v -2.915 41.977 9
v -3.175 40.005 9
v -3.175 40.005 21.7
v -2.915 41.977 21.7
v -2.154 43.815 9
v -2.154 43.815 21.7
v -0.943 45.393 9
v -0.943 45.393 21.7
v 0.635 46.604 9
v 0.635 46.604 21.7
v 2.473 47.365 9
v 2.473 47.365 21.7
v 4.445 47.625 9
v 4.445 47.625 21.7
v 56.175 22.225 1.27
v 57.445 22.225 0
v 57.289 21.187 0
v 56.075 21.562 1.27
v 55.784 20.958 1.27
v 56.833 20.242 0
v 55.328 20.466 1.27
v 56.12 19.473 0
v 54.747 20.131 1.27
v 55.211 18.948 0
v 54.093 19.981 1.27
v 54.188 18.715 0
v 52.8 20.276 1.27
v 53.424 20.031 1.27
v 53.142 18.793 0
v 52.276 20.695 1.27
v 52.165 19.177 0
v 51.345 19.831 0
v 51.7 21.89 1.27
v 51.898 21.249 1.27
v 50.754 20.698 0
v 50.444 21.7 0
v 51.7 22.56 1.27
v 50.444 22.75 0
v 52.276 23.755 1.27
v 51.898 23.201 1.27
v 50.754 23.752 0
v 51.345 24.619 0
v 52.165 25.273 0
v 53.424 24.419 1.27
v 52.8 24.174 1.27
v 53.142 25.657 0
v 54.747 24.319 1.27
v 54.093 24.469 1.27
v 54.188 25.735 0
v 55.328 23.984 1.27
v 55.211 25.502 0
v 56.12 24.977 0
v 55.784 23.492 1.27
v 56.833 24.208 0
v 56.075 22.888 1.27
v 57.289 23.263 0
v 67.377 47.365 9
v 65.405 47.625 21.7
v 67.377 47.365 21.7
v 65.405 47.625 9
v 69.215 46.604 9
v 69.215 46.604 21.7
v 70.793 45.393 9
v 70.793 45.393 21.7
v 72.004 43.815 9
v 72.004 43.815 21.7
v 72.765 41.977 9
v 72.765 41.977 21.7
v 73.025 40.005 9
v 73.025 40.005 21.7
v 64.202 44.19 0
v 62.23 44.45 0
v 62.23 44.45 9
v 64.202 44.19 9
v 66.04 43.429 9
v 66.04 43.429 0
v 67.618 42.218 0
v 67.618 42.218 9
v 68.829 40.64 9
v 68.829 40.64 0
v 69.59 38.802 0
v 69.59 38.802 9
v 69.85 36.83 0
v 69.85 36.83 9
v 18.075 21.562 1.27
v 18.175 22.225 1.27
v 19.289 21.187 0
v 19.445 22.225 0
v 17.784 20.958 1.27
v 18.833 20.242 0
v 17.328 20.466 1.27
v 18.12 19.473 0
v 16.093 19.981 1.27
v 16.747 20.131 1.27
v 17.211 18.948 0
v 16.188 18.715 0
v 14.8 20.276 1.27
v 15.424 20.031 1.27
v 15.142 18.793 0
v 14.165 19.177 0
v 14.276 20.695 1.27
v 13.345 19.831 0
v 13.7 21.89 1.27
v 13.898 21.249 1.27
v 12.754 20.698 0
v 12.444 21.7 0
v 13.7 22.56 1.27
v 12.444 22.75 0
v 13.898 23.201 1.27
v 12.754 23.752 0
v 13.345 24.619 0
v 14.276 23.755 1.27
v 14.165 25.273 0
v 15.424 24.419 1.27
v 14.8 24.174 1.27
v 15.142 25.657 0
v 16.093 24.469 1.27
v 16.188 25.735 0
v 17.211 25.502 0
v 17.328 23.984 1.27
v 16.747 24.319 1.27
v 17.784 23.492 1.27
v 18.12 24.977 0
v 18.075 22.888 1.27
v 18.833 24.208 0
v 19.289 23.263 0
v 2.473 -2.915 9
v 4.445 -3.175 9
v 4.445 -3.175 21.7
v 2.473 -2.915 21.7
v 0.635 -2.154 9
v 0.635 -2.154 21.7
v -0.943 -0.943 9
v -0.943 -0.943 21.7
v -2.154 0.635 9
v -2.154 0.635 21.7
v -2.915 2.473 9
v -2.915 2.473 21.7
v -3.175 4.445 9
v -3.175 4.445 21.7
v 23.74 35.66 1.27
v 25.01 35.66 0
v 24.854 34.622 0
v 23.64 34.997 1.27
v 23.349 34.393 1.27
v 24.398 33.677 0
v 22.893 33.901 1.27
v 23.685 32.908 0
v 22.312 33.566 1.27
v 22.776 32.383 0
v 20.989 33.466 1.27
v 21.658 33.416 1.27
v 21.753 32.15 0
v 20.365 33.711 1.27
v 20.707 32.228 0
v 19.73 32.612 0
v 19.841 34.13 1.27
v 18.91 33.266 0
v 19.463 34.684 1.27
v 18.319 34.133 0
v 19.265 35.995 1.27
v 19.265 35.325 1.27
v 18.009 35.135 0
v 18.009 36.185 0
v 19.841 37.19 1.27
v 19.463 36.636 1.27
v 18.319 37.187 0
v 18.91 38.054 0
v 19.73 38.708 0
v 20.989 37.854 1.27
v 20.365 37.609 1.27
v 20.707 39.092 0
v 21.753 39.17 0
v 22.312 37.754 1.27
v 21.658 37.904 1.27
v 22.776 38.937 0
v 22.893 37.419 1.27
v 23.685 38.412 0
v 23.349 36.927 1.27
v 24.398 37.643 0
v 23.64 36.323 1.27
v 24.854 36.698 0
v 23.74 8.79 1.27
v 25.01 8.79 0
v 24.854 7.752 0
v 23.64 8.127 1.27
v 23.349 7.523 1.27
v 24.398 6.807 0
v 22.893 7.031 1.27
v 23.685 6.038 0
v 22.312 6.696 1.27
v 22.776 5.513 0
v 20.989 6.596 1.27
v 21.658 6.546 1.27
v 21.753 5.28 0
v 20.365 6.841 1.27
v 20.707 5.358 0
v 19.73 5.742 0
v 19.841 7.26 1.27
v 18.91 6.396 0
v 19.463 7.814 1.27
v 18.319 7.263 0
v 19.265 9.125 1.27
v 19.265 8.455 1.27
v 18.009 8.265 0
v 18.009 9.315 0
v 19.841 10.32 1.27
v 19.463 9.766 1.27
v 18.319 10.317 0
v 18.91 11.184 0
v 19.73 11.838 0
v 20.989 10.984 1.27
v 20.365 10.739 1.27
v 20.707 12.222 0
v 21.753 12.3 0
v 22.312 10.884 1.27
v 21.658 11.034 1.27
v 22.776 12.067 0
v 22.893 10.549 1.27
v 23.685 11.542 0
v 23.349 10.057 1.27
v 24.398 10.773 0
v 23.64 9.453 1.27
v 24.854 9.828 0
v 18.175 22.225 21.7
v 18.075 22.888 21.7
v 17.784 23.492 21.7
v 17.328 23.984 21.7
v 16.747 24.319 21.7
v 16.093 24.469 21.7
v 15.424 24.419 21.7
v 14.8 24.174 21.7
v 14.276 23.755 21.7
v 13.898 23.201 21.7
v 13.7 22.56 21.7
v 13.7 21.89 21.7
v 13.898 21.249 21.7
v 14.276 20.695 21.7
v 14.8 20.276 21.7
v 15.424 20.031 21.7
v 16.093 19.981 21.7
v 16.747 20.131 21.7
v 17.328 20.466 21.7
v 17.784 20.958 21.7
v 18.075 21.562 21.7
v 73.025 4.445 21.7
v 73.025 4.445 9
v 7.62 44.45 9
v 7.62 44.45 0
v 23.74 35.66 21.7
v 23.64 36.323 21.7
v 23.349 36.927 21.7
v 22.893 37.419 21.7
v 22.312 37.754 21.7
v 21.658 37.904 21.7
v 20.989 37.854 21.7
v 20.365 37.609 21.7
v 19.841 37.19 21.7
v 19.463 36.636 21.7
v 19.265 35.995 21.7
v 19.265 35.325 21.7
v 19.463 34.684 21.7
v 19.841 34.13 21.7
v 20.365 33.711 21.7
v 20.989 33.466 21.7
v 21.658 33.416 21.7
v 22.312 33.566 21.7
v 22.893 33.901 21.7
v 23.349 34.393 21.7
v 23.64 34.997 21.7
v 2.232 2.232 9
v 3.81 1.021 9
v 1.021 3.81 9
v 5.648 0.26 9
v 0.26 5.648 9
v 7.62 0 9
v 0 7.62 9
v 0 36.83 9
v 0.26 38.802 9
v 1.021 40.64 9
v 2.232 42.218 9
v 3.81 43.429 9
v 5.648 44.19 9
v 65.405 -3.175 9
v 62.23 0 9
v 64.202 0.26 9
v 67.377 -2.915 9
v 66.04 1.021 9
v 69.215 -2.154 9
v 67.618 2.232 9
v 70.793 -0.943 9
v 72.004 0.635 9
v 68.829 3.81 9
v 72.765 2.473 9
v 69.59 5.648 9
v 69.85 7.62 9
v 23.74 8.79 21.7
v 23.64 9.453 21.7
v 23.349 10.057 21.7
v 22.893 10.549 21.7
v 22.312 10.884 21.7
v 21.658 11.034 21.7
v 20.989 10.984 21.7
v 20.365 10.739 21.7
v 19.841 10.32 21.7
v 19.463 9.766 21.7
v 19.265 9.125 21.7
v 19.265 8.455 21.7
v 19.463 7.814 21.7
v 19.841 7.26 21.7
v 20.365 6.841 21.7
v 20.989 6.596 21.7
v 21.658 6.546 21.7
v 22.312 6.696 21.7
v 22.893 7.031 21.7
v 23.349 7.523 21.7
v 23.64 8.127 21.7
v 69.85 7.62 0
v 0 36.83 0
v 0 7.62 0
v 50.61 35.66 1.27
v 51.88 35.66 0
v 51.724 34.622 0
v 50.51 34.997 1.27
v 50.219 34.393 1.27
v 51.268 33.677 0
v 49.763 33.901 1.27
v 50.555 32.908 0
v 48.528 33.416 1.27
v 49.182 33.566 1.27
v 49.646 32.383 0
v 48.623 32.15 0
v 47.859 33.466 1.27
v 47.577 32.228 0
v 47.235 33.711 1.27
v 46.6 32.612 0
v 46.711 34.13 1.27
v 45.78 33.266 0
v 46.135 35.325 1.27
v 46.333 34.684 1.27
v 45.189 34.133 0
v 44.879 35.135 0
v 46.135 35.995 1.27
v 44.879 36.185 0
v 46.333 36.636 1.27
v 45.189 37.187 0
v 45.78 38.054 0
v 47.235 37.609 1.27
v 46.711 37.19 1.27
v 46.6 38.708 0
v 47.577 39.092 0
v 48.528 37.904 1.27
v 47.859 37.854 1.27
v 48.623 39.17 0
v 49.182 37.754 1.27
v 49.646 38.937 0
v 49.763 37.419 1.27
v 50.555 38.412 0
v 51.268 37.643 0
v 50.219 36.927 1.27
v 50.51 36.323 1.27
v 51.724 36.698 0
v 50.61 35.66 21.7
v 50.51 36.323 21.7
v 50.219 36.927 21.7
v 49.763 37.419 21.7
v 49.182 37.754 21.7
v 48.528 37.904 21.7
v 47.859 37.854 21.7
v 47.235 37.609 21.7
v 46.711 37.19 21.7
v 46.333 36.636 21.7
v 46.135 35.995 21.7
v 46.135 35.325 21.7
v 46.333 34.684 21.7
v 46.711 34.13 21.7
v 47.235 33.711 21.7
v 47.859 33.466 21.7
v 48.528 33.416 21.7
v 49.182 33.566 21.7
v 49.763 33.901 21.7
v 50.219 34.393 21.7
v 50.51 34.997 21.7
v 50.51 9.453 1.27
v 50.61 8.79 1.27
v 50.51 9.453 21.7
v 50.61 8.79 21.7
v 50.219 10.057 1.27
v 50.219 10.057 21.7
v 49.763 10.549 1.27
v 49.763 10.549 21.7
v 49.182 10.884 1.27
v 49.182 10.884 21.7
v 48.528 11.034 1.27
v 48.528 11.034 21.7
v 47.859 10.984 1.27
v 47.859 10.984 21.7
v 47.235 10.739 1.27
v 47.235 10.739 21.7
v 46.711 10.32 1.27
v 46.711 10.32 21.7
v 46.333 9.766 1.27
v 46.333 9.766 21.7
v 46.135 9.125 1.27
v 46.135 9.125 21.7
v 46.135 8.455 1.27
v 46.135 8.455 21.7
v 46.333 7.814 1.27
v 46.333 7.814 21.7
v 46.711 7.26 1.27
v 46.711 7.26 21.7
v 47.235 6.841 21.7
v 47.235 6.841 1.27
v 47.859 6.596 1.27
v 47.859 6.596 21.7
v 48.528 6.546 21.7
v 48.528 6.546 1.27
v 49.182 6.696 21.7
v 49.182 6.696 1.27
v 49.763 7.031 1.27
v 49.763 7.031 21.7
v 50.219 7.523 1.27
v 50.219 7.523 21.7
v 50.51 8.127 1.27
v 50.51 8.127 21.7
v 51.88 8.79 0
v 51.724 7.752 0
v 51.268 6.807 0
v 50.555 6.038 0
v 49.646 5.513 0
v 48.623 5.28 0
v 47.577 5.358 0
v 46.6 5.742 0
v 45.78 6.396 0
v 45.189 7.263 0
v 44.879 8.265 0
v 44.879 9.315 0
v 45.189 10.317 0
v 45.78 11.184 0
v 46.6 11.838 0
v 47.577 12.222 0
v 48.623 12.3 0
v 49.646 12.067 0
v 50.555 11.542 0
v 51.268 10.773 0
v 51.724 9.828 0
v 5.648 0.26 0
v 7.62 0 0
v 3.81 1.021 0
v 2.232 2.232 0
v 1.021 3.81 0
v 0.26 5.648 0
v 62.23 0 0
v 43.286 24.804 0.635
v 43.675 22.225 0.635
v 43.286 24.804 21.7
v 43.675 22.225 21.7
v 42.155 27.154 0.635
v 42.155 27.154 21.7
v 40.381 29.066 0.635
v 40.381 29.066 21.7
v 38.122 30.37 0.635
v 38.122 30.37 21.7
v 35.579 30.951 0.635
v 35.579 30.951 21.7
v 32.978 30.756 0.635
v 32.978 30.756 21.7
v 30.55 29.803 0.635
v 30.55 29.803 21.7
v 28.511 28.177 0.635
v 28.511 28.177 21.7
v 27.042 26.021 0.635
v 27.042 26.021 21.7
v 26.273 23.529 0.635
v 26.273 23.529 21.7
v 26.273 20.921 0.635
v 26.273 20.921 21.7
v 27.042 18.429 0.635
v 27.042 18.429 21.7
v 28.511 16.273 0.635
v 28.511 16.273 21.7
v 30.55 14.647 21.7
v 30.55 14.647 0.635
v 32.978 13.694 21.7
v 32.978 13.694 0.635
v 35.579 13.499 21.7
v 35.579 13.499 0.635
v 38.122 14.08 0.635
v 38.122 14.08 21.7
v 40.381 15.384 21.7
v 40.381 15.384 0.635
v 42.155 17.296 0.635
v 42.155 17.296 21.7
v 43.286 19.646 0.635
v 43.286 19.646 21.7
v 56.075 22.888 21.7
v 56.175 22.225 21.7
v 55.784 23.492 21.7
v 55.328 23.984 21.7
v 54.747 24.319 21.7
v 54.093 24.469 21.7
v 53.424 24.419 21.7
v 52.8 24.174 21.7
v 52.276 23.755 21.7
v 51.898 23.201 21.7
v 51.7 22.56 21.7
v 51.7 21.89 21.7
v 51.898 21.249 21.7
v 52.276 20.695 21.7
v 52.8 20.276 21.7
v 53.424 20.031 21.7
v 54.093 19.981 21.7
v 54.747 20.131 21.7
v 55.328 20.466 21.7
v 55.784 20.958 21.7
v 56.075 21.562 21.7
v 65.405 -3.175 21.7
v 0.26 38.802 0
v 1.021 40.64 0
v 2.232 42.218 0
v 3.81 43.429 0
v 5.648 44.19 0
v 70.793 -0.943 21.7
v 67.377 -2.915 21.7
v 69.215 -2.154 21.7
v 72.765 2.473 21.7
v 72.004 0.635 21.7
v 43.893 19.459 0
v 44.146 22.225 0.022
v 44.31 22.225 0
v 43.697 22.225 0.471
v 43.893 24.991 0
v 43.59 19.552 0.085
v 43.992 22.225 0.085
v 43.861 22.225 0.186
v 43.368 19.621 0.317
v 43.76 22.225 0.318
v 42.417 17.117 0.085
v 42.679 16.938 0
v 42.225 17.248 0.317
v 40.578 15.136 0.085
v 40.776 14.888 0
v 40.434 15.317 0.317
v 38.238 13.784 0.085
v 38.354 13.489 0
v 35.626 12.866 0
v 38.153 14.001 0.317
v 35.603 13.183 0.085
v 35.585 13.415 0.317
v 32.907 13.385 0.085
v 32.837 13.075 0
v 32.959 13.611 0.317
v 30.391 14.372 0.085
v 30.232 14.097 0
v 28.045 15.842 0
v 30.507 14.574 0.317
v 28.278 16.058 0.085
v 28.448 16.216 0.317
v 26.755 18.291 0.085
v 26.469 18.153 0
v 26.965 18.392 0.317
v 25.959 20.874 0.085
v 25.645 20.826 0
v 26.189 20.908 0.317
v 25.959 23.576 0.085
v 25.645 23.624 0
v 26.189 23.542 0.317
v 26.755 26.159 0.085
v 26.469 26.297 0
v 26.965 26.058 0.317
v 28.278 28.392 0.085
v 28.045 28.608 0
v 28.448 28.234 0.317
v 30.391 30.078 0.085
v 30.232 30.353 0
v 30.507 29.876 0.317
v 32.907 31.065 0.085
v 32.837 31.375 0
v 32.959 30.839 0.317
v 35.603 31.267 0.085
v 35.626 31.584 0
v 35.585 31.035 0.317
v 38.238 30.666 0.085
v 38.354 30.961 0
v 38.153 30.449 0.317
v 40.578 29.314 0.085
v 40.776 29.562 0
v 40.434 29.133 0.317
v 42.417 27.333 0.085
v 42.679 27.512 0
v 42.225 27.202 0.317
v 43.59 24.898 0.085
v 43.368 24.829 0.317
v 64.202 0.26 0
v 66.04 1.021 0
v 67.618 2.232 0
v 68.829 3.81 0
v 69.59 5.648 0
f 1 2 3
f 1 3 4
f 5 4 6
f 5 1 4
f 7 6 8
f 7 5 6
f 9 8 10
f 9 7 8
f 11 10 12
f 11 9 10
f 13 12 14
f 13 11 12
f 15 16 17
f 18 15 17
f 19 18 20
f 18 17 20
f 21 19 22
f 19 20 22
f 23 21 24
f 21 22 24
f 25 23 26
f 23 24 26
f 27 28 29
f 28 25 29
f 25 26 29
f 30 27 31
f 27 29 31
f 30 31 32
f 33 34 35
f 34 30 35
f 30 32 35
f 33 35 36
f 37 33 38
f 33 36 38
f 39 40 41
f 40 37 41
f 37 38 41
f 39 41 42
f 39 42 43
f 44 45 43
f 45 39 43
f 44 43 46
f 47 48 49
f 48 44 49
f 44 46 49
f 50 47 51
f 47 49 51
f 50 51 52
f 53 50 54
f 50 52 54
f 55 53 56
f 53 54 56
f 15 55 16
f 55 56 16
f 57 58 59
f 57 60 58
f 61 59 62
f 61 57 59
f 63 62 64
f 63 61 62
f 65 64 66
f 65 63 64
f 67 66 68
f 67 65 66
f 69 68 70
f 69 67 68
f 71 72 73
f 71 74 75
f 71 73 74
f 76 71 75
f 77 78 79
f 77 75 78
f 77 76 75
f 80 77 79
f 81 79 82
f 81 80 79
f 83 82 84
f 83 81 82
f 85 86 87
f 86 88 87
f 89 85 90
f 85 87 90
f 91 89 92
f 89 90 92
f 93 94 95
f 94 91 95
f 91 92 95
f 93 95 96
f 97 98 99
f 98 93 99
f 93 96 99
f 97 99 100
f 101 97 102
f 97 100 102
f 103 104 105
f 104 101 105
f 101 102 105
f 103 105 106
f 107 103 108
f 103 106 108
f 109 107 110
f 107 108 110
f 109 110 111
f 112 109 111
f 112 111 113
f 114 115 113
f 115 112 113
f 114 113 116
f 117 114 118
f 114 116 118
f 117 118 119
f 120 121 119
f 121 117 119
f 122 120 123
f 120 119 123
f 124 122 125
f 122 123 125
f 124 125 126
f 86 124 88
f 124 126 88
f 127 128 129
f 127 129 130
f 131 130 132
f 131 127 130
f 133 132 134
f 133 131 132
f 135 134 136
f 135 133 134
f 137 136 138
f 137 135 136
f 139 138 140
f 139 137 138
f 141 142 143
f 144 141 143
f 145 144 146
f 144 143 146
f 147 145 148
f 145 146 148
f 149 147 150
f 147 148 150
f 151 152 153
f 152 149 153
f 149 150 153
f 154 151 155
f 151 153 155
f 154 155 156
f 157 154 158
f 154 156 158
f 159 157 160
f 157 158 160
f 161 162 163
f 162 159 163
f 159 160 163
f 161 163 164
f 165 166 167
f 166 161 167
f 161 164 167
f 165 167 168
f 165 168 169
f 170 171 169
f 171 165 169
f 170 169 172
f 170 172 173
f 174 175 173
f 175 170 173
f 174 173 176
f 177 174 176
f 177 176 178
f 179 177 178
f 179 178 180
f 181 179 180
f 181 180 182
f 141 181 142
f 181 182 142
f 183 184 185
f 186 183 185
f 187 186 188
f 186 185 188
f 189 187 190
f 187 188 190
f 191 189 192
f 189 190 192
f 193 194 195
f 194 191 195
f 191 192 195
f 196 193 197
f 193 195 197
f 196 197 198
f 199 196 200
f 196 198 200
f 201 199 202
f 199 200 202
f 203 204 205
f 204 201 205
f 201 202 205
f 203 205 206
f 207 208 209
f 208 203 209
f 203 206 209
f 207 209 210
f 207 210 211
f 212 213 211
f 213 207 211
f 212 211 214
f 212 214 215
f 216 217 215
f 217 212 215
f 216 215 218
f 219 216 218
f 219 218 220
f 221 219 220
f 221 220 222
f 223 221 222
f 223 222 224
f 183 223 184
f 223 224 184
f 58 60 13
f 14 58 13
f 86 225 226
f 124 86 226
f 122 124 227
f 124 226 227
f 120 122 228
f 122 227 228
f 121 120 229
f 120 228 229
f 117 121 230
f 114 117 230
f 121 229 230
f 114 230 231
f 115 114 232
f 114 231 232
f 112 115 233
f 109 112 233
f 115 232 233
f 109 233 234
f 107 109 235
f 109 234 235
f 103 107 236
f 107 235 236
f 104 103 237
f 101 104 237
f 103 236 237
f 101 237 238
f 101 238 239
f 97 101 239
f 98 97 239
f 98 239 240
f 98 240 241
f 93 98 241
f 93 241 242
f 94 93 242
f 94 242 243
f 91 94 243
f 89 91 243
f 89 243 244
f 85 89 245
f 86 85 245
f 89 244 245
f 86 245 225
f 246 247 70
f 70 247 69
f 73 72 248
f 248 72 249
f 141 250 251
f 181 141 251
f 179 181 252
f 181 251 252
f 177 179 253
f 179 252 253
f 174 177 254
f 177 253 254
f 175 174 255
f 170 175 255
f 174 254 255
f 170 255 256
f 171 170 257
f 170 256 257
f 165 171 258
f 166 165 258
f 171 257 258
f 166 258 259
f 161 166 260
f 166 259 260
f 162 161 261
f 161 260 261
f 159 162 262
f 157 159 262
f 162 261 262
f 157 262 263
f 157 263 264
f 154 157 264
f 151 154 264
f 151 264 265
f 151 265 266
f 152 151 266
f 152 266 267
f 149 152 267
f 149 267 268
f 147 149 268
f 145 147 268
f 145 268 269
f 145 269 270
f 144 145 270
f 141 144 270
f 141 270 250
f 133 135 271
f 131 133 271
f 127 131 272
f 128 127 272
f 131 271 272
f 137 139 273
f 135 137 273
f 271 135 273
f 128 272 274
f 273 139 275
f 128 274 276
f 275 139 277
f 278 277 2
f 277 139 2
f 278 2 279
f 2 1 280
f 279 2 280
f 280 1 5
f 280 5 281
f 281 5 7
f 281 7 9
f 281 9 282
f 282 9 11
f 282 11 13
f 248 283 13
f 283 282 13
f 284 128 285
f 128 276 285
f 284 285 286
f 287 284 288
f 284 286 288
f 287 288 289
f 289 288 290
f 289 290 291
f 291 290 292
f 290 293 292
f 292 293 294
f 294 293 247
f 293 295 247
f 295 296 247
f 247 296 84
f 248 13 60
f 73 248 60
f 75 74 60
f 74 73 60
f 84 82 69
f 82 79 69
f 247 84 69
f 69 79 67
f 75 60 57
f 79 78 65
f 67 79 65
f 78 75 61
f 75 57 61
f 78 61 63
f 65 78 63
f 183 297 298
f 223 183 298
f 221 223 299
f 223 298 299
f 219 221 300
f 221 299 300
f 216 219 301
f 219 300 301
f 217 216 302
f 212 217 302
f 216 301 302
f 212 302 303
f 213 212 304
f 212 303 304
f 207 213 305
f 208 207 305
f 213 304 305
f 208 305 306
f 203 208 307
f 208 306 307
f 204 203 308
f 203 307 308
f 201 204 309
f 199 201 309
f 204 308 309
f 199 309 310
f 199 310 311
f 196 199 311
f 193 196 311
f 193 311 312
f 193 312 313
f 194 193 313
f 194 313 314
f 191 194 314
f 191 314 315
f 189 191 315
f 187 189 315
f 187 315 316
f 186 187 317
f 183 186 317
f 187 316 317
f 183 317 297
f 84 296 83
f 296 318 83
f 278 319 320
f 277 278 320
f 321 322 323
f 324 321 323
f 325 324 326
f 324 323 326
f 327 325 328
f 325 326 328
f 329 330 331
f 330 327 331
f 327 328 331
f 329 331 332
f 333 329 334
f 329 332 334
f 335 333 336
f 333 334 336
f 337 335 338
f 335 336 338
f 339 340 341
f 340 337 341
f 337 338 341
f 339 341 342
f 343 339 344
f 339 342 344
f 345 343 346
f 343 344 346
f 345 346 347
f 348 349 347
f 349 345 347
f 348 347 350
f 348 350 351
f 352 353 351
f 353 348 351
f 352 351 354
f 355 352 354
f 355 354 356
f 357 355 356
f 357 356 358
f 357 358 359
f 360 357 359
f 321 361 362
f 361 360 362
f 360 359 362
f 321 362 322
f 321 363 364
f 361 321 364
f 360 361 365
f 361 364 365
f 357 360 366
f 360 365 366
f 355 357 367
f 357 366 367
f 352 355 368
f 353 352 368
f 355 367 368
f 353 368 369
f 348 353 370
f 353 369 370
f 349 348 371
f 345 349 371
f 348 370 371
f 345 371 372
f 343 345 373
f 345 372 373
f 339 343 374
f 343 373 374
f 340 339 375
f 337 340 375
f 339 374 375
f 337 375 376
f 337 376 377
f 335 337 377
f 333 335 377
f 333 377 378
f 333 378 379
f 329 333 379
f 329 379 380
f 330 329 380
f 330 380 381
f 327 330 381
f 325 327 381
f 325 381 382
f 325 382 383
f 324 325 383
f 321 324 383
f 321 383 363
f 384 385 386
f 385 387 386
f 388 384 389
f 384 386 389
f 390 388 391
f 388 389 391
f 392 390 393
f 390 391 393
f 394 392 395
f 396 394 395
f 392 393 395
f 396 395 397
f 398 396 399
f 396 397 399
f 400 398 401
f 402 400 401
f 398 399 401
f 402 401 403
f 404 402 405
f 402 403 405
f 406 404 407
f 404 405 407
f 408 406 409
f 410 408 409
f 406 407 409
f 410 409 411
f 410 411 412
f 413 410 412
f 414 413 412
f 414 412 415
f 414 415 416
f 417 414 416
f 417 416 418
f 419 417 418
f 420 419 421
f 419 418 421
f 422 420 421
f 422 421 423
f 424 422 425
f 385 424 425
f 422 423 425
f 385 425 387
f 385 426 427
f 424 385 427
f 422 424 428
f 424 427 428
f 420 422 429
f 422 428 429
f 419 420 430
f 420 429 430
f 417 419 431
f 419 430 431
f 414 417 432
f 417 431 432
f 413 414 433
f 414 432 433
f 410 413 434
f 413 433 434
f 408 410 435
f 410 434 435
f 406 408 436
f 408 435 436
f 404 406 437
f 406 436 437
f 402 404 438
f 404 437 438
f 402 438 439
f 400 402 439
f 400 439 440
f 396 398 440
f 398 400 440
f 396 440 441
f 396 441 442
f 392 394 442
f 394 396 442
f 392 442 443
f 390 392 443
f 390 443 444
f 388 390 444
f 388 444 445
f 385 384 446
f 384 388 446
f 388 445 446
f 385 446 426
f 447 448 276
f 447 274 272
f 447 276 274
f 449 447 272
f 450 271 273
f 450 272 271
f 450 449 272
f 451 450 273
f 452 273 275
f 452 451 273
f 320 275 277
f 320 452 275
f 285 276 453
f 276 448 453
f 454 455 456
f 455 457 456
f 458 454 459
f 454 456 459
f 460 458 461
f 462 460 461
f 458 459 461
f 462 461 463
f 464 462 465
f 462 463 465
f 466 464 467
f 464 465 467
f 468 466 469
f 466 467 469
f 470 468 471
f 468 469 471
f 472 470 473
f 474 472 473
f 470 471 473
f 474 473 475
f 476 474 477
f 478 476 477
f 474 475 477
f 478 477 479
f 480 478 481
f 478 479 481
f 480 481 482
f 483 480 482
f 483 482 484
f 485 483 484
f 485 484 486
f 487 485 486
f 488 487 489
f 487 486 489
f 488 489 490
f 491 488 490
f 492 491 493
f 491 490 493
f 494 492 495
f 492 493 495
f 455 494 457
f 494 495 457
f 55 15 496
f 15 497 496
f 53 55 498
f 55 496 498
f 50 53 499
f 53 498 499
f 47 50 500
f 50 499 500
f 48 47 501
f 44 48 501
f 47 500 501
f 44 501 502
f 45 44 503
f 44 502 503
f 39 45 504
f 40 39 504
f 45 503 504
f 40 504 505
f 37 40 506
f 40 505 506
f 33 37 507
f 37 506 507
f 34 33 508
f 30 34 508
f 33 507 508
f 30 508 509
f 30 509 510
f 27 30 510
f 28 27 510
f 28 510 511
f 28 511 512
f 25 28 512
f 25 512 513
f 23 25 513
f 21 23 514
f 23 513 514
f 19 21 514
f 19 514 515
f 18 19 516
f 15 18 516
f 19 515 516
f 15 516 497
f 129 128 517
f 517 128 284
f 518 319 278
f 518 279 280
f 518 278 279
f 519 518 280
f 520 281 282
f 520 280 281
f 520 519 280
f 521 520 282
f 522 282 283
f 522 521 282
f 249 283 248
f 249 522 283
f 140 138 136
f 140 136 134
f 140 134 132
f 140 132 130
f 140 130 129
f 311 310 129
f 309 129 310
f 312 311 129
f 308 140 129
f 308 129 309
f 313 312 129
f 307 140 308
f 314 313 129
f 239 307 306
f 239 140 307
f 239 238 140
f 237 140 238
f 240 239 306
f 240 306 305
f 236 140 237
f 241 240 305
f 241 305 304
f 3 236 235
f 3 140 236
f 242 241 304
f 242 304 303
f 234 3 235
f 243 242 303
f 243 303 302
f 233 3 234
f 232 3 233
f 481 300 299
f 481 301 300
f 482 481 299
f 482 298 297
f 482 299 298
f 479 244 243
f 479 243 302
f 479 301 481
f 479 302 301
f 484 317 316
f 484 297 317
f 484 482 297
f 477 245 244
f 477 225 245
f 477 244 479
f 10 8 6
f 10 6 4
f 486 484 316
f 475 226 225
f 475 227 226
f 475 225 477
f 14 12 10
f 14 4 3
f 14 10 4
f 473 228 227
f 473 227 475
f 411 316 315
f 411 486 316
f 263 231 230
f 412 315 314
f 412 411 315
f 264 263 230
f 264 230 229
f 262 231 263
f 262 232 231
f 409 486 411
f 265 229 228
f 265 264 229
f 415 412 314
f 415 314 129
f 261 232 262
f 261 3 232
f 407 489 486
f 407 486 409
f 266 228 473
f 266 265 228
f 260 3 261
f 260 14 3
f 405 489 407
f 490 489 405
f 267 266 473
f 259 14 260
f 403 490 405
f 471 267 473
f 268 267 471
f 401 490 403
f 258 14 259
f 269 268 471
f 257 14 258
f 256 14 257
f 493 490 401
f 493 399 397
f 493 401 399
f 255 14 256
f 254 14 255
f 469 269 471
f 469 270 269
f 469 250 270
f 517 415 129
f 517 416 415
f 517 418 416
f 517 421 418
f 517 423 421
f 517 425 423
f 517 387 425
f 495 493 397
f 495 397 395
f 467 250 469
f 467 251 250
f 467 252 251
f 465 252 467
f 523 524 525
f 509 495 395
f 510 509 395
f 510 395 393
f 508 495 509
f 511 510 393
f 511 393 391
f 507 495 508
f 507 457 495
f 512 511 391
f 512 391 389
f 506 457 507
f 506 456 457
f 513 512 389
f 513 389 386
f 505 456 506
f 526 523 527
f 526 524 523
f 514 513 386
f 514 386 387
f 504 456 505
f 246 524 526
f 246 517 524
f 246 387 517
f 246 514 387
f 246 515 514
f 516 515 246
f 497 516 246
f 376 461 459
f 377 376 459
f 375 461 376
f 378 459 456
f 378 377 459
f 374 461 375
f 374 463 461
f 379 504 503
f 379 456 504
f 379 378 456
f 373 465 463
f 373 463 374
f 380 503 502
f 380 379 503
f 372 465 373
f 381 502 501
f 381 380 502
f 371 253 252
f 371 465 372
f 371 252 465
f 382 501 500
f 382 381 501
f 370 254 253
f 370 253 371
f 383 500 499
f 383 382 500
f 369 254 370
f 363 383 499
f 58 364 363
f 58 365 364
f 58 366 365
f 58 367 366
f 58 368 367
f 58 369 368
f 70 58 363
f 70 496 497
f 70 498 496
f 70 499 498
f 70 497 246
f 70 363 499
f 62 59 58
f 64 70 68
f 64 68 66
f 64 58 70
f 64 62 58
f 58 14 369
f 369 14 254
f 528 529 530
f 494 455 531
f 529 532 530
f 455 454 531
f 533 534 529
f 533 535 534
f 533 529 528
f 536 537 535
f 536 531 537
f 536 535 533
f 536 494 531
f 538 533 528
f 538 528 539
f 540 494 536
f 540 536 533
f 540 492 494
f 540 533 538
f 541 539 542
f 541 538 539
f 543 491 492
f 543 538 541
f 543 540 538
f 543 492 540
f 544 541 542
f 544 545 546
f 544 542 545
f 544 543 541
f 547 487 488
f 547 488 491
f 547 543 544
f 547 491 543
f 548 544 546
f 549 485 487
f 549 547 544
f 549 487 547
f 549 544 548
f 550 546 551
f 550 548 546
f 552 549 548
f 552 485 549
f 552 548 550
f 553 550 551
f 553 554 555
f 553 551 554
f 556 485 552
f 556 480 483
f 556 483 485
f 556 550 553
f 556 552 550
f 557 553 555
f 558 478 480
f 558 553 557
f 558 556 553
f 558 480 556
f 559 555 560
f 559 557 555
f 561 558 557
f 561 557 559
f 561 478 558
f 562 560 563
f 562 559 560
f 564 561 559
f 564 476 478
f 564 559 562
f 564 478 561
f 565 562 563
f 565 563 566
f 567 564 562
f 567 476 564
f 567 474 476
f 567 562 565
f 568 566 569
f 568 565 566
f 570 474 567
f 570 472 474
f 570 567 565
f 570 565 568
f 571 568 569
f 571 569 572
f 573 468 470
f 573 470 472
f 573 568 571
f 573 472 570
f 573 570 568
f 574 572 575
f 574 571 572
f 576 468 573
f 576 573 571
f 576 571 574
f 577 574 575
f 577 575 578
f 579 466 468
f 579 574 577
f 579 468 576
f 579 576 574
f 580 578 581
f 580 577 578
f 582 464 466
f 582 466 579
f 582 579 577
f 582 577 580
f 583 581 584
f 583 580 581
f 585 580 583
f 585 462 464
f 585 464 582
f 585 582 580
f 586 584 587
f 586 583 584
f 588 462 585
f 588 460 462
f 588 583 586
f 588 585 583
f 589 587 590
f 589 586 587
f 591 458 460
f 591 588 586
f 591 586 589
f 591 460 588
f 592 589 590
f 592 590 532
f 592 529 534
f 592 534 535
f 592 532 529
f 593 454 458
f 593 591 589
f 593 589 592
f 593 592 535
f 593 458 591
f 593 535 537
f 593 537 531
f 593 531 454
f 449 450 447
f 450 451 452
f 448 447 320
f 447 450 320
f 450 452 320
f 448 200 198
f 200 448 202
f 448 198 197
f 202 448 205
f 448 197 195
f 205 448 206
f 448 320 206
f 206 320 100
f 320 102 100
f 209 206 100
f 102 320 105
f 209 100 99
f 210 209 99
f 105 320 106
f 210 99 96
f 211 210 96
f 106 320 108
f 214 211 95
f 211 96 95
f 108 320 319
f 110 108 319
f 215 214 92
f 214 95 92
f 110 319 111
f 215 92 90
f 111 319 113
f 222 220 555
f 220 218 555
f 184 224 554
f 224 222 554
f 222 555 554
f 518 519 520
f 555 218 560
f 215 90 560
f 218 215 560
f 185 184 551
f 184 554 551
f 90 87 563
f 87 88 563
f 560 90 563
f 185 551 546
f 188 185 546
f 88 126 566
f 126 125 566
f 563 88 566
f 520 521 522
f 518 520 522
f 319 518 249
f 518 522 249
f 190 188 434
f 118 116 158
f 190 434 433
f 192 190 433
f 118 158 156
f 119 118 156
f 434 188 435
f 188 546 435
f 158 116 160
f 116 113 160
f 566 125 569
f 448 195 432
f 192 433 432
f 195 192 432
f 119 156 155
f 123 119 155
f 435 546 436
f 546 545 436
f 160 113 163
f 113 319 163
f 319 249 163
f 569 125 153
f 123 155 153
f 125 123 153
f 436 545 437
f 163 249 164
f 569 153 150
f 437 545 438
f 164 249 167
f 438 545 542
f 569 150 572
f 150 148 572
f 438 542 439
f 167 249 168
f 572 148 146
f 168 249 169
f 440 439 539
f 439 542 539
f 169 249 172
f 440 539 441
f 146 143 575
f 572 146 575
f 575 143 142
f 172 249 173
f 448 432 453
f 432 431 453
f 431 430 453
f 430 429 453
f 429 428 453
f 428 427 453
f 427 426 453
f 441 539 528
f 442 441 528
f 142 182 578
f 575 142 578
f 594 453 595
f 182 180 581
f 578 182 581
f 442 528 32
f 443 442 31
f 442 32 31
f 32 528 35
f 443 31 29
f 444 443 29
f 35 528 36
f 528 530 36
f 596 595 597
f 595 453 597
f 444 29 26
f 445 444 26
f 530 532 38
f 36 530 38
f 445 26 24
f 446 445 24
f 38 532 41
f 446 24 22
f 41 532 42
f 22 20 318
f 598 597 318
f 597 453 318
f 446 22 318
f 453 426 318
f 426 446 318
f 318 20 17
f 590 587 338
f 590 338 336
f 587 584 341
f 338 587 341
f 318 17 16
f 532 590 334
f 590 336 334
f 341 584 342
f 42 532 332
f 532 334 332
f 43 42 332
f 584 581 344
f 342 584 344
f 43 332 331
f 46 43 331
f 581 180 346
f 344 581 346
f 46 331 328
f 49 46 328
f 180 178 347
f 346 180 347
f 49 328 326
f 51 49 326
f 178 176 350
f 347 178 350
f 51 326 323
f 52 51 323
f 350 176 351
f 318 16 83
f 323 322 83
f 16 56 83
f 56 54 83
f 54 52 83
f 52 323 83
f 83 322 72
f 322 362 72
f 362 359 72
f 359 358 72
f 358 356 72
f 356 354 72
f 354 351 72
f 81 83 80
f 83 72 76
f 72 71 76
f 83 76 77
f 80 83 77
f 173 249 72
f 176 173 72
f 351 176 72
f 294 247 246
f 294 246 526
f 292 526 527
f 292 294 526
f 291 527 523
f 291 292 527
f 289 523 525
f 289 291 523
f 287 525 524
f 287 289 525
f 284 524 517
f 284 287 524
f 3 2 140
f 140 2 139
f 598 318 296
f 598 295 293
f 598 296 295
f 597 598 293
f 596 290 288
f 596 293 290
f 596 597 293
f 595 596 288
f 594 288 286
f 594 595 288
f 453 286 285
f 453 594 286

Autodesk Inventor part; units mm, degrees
ref_plane "YZ Plane" through (0, 0, 0) normal (1, 0, 0) x (0, 1, 0)
ref_plane "XZ Plane" through (0, 0, 0) normal (0, 1, 0) x (-1, 0, 0)
sketch "Sketch1" plane through (0, 0, 0) normal (0, 0, 1) x (1, 0, 0)
  line L0 (7.62, 0) -> (62.23, 0)
  line L1 (69.85, 7.62) -> (69.85, 36.83)
  line L2 (62.23, 44.45) -> (7.62, 44.45)
  line L3 (0, 36.83) -> (0, 7.62)
  arc A0 (7.62, 44.45) -> (0, 36.83) centre (7.62, 36.83) ccw
  arc A1 (0, 7.62) -> (7.62, 0) centre (7.62, 7.62) ccw
  arc A2 (62.23, 0) -> (69.85, 7.62) centre (62.23, 7.62) ccw
  arc A3 (69.85, 36.83) -> (62.23, 44.45) centre (62.23, 36.83) ccw
  point P0 (0, 0)
  point P1 (69.85, 44.45)
  point P2 (69.85, 0)
  point P3 (0, 44.45)
  dimension "d0" = 69.85
  dimension "d1" = 44.45
  dimension "d2" = 7.62
extrude "Extrusion1" add sketch "Sketch1" along normal blind 9
sketch "Sketch2" plane through (0, 0, 9) normal (0, 0, 1) x (1, 0, 0)
  line L0 (4.445, -3.175) -> (65.405, -3.175)
  line L1 (73.025, 4.445) -> (73.025, 40.005)
  line L2 (65.405, 47.625) -> (4.445, 47.625)
  line L3 (-3.175, 40.005) -> (-3.175, 4.445)
  arc A0 (4.445, 47.625) -> (-3.175, 40.005) centre (4.445, 40.005) ccw
  arc A1 (-3.175, 4.445) -> (4.445, -3.175) centre (4.445, 4.445) ccw
  arc A2 (65.405, -3.175) -> (73.025, 4.445) centre (65.405, 4.445) ccw
  arc A3 (73.025, 40.005) -> (65.405, 47.625) centre (65.405, 40.005) ccw
  line L4 (62.23, 44.45) -> (7.62, 44.45) construction
  line L5 (0, 36.83) -> (0, 7.62) construction
  point P0 (0, 0)
  point P1 (73.025, 47.625)
  point P2 (73.025, -3.175)
  point P3 (-3.175, 47.625)
  point P4 (34.925, 47.625)
  point P5 (34.925, 44.45)
  point P6 (-3.175, 22.225)
  point P7 (0, 22.225)
  dimension "d5" = 76.2
  dimension "d6" = 50.8
  dimension "d7" = 7.62
extrude "Extrusion2" add sketch "Sketch2" along normal blind 12.7
fillet "Fillet1" [suppressed]
sketch "Sketch3" plane through (0, 0, 21.7) normal (0, 0, 1) x (1, 0, 0)
  line L0 (65.405, 47.625) -> (4.445, 47.625) construction
  line L1 (65.405, 47.625) -> (4.445, 47.625) construction
  line L2 (-3.175, 40.005) -> (-3.175, 4.445) construction
  line L3 (-3.175, 40.005) -> (-3.175, 4.445) construction
  circle A0 centre (34.925, 22.225) radius 8.75
  circle A1 centre (34.925, 22.225) radius 19 construction
  circle A2 centre (21.49, 35.66) radius 2.25
  circle A3 centre (48.36, 35.66) radius 2.25
  circle A4 centre (15.925, 22.225) radius 2.25
  circle A5 centre (53.925, 22.225) radius 2.25
  circle A6 centre (21.49, 8.79) radius 2.25
  circle A7 centre (48.36, 8.79) radius 2.25
  line L4 (21.49, 35.66) -> (34.925, 22.225) construction
  line L5 (34.925, 22.225) -> (15.925, 22.225) construction
  point P0 (0, 0)
  point P1 (34.925, 47.625)
  point P2 (-3.175, 22.225)
  point P3 (-3.175, 22.225)
  dimension "d11" = 17.5
  dimension "d14" = 4.5
  dimension "d15" = 38
  dimension "d16" = 45
extrude "Extrusion3" cut sketch "Sketch3" against normal up to surface (21.7 mm away)
chamfer "Chamfer1" distance 1.27 angle 45 6 edges at (46.11, 35.66, 0) (19.24, 35.66, 0) (13.675, 22.225, 0) (51.675, 22.225, 0) (46.11, 8.79, 0) (19.24, 8.79, 0)
sketch "Sketch4" plane through (7.62, 0, 0) normal (0, -1, 0) x (1, 0, 0)
  point P0 (-7.62, 0)
ref_plane "Work Plane1" through (-0.635, 46.99, -50.8) normal (0, 1, 0) x (0, 0, 1)
sketch "Sketch8" plane through (0, 0, 0) normal (0, 0, -1) x (-1, 0, 0)
  point P0 (0, 0)
fillet "Fillet2" radius 0.635 1 edges at (26.175, 22.225, 0)
properties part number "2x3_Spacer_Rear_metal"
